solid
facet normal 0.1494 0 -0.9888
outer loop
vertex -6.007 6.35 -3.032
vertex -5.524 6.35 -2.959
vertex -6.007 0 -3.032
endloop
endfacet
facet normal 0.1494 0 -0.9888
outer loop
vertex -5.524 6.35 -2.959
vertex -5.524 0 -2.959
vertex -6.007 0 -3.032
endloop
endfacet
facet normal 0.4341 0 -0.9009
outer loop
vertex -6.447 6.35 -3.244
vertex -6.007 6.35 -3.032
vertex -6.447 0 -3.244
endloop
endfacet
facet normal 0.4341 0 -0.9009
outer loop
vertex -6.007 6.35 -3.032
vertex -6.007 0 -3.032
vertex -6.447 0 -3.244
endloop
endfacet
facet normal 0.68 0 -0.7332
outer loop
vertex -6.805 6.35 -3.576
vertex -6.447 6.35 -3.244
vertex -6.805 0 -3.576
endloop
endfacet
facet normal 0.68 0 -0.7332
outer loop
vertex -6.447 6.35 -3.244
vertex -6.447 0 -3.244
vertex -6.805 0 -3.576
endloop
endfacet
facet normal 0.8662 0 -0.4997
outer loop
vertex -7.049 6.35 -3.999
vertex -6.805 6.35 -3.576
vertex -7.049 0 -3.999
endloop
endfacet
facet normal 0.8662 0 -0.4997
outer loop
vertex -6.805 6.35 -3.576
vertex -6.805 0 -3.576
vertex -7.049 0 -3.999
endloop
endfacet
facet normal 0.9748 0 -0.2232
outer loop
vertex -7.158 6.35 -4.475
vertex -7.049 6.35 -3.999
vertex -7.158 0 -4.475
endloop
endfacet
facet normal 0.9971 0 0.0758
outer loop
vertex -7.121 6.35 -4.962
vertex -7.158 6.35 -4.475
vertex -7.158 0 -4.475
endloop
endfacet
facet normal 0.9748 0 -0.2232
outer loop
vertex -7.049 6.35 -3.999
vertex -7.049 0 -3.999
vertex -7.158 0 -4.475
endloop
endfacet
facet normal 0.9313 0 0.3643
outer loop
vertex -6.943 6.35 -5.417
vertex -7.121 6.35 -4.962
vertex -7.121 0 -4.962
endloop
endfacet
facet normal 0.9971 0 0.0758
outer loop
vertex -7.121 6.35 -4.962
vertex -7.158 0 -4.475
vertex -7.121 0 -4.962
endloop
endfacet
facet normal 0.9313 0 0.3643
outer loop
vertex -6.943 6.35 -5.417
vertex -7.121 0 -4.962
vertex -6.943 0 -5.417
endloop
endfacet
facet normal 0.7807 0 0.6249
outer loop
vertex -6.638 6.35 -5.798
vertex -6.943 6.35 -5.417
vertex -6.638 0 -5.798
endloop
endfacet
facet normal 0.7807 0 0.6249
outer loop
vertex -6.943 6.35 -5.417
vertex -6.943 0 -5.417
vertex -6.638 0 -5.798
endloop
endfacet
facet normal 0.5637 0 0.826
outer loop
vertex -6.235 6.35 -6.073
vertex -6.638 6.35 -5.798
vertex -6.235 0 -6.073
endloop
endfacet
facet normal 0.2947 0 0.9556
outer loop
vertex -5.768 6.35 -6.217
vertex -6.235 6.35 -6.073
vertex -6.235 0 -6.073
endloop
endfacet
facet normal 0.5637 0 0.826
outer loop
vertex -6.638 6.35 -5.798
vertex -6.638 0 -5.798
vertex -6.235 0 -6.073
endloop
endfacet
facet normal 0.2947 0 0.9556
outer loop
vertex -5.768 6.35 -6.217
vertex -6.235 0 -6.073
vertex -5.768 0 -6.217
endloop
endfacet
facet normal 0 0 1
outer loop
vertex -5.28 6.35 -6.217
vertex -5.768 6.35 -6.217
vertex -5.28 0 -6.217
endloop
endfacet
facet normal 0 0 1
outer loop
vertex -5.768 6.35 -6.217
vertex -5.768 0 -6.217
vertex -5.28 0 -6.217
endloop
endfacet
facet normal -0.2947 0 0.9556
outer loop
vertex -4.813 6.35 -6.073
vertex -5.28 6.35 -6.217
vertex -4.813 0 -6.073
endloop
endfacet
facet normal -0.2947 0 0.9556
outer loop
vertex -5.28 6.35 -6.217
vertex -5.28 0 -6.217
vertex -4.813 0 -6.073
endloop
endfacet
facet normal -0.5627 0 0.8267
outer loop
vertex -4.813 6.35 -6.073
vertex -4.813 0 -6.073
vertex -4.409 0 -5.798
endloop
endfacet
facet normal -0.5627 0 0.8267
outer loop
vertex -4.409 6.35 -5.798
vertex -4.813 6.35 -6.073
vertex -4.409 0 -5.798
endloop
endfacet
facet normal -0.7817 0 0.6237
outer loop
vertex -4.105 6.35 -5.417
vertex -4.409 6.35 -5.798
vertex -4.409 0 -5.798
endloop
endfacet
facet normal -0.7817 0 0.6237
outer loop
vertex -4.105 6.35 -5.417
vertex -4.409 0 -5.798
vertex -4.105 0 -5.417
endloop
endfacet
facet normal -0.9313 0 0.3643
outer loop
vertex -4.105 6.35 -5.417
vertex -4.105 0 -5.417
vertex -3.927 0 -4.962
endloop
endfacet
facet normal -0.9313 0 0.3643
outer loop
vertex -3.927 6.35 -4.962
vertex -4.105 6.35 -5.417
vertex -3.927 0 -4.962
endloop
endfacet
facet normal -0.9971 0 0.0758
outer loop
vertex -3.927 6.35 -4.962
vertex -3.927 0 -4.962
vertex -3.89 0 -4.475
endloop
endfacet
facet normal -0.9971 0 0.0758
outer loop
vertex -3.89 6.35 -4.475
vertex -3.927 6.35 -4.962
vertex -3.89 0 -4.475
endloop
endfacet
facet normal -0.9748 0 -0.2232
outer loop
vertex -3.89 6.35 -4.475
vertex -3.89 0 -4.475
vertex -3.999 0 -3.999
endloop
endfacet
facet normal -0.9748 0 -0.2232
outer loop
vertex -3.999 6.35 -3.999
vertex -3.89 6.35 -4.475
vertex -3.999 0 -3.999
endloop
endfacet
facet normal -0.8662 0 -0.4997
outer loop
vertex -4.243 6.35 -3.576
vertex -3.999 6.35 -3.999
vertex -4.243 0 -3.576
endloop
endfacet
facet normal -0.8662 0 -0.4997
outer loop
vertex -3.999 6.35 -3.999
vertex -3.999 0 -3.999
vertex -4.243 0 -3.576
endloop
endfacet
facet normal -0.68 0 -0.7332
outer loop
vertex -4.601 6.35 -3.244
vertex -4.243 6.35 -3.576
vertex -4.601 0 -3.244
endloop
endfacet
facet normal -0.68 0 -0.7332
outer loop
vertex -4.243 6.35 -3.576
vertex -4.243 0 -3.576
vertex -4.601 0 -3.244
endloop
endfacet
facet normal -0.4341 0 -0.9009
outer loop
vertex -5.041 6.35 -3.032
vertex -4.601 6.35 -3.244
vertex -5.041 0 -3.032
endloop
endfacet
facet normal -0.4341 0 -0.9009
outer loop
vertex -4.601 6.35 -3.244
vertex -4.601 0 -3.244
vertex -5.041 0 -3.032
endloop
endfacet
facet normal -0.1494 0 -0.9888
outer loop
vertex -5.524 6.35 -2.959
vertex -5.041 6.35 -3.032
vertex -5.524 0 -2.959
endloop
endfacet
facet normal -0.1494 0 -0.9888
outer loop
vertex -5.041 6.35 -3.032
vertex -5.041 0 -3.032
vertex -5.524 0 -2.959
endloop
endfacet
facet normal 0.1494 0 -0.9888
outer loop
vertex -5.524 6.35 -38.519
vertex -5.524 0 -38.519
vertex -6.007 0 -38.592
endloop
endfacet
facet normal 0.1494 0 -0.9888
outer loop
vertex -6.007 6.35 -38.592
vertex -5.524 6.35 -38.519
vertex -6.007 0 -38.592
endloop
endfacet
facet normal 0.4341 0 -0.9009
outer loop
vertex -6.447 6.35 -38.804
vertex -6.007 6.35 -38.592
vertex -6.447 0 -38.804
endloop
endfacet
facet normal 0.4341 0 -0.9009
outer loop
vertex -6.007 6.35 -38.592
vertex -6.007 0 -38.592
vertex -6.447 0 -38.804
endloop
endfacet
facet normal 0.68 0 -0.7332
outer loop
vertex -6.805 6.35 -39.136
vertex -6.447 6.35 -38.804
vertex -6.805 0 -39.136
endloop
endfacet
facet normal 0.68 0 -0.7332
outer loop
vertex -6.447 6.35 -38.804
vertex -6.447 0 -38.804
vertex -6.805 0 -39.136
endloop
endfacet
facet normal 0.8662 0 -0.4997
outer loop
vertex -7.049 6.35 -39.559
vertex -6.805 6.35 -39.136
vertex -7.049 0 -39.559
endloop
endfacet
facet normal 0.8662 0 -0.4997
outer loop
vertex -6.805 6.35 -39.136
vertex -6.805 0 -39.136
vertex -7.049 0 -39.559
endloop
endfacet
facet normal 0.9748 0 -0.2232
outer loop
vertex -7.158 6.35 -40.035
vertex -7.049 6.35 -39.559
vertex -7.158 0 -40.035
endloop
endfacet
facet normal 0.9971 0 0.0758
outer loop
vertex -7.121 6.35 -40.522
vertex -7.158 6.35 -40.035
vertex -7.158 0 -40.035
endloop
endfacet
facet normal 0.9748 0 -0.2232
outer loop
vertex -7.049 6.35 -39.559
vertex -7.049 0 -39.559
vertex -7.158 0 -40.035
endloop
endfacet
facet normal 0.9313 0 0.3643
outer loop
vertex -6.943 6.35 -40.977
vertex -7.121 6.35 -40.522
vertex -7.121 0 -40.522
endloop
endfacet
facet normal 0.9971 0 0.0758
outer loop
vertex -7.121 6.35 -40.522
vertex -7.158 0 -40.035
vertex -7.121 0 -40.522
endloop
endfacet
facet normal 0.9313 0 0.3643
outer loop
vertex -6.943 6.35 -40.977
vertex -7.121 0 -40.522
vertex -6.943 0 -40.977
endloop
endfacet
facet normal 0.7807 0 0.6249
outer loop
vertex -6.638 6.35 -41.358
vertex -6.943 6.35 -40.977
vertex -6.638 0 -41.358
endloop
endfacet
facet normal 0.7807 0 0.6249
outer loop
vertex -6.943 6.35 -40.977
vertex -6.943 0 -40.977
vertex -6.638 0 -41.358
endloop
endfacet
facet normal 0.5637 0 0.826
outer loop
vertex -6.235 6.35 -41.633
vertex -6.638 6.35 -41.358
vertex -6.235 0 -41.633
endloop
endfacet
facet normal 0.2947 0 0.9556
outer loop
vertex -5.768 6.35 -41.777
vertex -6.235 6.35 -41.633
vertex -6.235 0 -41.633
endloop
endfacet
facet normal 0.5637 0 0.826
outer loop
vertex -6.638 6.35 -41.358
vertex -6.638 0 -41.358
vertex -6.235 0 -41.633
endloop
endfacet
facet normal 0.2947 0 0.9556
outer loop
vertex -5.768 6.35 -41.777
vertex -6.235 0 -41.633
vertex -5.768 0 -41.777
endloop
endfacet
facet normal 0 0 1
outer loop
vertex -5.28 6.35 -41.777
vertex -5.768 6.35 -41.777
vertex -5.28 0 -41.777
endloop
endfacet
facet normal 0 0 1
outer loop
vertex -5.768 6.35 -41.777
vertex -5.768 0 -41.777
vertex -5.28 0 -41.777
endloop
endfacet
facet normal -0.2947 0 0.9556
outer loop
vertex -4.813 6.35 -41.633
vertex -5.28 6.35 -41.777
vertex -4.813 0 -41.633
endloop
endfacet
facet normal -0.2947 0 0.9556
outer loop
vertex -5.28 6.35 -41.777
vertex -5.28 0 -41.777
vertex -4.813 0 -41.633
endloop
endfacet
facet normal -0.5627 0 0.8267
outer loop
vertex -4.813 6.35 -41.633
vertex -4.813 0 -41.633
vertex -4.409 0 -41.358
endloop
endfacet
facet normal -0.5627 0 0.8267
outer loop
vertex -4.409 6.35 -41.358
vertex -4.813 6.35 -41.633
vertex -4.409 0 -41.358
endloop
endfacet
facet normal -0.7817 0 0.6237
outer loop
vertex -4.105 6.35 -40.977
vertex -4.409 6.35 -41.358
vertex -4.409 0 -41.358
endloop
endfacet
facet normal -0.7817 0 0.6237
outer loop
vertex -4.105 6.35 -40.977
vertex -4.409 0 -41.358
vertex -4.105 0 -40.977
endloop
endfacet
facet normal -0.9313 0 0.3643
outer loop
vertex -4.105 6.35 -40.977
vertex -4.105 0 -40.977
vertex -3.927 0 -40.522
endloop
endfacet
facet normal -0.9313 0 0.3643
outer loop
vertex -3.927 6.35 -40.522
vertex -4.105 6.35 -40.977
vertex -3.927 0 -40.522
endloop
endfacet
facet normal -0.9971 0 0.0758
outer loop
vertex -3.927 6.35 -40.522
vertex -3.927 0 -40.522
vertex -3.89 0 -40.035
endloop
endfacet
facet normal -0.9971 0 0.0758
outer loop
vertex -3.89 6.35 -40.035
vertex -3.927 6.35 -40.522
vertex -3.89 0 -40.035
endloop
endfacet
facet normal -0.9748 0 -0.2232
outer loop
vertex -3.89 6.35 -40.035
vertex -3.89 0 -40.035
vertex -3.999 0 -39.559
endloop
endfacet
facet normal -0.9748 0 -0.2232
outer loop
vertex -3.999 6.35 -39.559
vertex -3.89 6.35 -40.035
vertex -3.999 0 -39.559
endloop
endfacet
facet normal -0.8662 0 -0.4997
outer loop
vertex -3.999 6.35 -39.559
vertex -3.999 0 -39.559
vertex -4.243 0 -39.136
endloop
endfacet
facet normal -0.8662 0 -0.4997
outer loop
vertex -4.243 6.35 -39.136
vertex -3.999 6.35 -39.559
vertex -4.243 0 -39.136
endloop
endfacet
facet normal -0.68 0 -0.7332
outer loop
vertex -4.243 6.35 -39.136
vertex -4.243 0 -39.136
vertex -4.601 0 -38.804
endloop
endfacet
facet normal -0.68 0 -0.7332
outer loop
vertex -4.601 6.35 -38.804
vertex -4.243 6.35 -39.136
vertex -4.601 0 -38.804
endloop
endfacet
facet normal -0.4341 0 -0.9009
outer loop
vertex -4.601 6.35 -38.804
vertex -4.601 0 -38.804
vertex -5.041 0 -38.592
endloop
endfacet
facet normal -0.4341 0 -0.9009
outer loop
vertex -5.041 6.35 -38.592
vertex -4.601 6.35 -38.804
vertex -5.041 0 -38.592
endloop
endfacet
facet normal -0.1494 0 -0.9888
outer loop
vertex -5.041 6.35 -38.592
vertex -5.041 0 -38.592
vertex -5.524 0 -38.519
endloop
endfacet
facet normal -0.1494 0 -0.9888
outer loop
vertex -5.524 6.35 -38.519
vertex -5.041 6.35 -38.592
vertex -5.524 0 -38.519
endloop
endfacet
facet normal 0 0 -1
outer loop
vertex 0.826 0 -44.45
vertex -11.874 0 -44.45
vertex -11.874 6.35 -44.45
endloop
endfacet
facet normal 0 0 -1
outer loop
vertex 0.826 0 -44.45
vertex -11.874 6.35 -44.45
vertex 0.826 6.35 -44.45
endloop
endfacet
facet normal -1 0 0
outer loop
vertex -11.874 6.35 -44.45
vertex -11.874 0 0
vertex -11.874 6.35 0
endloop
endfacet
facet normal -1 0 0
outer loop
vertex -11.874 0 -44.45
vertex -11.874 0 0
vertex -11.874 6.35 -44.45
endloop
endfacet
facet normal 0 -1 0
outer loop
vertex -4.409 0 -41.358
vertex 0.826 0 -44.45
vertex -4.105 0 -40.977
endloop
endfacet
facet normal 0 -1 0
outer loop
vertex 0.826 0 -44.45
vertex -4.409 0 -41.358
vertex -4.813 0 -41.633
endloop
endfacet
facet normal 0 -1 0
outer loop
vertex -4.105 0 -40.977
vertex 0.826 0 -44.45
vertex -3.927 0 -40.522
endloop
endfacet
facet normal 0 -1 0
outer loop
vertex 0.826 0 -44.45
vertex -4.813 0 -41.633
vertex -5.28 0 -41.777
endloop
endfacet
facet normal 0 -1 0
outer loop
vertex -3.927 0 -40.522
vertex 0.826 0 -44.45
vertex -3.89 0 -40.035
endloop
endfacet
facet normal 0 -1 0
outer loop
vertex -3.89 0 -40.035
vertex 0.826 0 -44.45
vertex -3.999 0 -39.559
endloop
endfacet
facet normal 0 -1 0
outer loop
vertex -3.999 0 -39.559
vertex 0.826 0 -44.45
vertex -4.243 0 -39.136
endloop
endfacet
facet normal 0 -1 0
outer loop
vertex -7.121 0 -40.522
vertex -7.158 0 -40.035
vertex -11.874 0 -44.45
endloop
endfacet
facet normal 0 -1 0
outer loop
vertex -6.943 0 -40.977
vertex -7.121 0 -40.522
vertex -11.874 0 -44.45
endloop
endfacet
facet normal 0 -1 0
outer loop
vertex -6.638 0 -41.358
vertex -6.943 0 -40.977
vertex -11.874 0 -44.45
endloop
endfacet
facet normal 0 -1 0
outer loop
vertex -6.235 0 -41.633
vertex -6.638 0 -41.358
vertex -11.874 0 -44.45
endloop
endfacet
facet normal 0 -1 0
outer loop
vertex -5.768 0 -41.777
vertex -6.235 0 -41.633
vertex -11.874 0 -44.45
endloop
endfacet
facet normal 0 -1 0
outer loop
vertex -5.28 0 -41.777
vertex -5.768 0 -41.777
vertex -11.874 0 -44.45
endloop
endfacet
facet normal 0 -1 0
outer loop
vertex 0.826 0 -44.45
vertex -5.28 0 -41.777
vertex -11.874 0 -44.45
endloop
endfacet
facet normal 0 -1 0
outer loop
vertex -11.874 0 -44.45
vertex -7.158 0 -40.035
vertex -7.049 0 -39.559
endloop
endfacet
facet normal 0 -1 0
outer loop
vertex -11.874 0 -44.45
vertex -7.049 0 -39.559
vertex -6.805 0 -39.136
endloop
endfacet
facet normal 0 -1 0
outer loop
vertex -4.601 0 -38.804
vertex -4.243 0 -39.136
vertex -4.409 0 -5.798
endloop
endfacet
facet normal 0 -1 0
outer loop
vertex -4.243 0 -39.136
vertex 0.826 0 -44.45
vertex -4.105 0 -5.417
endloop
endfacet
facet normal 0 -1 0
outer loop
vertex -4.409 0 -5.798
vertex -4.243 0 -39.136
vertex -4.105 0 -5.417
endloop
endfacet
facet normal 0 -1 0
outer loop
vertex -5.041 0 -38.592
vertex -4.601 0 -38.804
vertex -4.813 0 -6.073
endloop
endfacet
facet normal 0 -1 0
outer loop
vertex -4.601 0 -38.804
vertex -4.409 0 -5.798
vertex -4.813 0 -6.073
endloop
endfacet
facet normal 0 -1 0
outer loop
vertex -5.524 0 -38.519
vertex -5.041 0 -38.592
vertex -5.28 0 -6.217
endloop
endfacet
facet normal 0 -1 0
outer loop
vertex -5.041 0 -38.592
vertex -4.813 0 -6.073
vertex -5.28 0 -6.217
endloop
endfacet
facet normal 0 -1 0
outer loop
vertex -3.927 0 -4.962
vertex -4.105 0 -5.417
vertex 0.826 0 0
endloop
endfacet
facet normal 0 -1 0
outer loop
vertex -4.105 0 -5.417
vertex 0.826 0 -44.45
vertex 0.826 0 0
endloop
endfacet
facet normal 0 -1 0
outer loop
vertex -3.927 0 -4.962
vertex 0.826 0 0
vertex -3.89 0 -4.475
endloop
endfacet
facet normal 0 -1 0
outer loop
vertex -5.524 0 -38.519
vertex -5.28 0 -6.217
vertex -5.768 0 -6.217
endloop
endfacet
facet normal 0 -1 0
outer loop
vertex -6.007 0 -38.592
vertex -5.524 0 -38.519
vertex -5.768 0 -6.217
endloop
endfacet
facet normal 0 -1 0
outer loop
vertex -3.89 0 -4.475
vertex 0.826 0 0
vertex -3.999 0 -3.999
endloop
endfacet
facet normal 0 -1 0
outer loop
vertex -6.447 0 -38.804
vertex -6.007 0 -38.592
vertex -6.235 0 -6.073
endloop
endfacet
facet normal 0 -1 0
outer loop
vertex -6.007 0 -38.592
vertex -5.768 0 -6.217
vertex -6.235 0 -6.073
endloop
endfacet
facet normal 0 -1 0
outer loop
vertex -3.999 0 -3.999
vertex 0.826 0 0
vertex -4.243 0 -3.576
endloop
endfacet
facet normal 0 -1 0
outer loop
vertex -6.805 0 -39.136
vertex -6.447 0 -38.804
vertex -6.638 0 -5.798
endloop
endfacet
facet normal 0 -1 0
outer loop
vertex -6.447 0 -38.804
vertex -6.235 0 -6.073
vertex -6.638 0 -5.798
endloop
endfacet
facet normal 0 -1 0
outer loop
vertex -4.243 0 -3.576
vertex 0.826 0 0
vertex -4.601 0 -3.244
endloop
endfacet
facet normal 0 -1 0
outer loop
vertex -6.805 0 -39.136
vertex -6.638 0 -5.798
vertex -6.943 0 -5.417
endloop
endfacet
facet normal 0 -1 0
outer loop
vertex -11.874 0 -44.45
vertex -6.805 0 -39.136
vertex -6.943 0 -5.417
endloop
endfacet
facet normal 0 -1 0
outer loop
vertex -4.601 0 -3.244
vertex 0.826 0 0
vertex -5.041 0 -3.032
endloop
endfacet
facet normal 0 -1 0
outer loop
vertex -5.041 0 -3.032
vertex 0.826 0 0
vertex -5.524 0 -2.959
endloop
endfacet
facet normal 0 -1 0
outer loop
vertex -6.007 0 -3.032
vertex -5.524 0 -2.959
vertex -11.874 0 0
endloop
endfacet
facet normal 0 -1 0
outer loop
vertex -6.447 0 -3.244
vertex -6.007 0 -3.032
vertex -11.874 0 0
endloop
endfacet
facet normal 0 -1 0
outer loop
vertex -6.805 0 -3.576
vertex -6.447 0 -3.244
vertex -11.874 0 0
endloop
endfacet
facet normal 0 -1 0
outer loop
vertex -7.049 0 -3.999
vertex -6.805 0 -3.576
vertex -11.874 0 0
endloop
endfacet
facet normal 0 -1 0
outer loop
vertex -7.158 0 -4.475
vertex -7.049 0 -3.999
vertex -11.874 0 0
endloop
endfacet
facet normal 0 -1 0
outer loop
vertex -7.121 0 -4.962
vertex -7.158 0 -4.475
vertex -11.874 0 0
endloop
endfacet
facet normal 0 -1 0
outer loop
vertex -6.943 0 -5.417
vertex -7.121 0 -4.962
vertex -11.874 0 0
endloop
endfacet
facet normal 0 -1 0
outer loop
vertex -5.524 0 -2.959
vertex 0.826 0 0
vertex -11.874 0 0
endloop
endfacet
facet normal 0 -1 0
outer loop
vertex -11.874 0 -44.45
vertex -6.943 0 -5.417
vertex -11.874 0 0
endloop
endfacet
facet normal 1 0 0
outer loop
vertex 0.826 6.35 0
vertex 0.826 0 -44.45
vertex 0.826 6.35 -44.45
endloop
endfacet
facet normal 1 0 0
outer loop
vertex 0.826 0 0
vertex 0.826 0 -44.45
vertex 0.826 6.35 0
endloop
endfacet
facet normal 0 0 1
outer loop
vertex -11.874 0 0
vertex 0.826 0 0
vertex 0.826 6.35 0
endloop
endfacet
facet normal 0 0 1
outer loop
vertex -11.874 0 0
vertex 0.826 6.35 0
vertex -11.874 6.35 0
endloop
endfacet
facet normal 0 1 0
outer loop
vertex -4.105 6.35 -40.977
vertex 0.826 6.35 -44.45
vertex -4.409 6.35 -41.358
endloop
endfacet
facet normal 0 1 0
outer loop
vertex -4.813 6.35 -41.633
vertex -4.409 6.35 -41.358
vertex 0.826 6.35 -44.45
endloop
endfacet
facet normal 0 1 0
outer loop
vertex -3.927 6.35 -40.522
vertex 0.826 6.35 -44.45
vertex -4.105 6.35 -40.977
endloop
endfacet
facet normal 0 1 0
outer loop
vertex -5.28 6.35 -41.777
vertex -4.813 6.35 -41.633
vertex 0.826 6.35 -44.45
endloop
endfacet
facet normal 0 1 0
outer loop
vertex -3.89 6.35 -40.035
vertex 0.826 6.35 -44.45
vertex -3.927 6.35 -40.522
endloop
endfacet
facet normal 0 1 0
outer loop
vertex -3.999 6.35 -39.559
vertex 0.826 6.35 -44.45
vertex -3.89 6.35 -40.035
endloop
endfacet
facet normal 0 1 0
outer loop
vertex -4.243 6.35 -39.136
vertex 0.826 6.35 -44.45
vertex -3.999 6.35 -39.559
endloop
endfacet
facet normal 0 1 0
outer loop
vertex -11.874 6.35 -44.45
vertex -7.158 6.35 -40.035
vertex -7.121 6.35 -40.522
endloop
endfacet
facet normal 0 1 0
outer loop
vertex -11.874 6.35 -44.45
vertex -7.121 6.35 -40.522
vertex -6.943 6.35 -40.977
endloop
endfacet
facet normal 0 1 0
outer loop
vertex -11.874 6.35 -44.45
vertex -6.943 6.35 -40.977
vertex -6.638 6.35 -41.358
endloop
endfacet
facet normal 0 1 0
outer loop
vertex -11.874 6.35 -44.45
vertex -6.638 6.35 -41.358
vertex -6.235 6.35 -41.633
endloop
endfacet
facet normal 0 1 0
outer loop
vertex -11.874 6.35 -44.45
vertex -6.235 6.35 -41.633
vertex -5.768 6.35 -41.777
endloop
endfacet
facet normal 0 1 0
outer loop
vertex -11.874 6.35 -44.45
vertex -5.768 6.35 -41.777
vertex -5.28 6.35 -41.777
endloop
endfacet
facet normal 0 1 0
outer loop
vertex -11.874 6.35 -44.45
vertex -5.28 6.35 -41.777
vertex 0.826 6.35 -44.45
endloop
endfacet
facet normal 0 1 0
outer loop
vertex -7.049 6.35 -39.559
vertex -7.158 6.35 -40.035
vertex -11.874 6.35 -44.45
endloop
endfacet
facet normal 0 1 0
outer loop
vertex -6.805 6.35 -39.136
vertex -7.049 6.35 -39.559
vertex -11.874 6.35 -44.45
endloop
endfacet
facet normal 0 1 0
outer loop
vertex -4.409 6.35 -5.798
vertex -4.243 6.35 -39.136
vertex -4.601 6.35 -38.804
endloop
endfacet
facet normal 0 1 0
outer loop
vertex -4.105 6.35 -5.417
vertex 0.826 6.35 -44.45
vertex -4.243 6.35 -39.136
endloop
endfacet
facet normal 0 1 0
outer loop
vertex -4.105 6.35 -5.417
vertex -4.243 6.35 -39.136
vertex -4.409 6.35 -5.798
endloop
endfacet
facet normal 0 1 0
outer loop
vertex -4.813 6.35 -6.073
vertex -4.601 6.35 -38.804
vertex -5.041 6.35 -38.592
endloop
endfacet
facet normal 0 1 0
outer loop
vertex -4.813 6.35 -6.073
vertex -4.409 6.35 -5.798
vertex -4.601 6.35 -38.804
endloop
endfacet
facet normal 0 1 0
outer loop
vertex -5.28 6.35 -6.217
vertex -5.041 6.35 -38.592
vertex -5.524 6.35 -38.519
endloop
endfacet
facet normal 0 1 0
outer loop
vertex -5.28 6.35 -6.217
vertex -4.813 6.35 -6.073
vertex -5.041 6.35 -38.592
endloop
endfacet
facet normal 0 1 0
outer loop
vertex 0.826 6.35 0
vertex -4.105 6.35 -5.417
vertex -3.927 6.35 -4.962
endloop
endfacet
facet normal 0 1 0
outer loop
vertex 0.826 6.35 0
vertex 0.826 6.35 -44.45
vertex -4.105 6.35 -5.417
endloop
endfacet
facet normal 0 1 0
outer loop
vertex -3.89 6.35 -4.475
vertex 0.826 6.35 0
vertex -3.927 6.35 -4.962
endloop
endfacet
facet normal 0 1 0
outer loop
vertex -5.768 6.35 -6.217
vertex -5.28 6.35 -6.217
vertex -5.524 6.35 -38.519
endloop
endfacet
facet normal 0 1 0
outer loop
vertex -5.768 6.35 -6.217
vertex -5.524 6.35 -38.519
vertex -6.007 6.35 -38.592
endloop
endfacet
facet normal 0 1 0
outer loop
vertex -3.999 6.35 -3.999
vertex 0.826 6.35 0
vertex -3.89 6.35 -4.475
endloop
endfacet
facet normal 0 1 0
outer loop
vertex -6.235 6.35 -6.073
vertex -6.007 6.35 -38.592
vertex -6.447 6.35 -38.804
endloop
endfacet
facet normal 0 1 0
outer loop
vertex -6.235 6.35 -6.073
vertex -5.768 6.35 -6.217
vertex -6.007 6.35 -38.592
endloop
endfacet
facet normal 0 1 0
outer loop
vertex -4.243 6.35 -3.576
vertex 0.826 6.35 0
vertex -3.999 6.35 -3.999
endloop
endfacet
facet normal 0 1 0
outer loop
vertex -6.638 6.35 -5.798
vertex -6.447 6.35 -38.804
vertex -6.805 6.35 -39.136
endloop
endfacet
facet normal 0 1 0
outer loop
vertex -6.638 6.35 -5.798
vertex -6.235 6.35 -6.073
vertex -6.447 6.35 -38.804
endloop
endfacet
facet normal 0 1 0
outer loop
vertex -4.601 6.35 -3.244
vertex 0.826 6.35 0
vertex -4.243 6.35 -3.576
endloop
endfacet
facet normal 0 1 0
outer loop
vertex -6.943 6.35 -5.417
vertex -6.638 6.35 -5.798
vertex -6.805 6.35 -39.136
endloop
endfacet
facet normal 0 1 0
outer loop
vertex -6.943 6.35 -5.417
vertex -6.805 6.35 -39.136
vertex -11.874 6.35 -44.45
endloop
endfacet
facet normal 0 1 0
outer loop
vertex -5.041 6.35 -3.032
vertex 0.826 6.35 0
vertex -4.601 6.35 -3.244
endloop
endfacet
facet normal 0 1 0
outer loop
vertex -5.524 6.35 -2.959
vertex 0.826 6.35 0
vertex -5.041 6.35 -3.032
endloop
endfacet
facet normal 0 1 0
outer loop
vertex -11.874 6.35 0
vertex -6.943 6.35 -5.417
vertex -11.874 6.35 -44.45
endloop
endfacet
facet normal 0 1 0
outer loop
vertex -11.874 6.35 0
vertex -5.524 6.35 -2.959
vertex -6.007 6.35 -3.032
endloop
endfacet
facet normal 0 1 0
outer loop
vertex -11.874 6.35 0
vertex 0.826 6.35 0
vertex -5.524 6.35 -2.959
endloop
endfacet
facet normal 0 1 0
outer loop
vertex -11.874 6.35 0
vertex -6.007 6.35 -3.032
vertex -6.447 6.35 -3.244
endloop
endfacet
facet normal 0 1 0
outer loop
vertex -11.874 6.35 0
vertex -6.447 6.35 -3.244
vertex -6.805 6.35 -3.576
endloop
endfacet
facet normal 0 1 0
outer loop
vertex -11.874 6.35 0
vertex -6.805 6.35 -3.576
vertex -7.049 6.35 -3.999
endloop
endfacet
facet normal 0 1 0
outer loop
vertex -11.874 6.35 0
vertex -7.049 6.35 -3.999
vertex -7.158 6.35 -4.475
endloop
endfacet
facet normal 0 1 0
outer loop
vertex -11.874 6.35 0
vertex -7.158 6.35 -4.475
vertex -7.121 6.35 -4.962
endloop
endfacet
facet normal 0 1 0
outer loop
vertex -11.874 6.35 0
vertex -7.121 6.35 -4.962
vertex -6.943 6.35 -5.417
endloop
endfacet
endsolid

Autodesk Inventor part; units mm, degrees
ref_plane "YZ Plane" through (0, 0, 0) normal (1, 0, 0) x (0, 1, 0)
ref_plane "XZ Plane" through (0, 0, 0) normal (0, 1, 0) x (-1, 0, 0)
ref_plane "XY Plane" through (0, 0, 0) normal (0, 0, 1) x (1, 0, 0)
sketch "Sketch1" plane through (0, 0, 0) normal (0, 1, 0) x (-1, 0, 0)
  line L0 (-0.8262, 0) -> (11.8738, 0)
  line L1 (11.8738, 0) -> (11.8738, -44.45)
  line L2 (11.8738, -44.45) -> (-0.8262, -44.45)
  line L3 (-0.8262, -44.45) -> (-0.8262, 0)
  point P0 (0, 0)
  dimension "d0" = 44.45
  dimension "d1" = 12.7
extrude "Plate1" add sketch "Sketch1" along normal blind 6.35
sketch "Sketch2" plane through (0, 6.35, 0) normal (0, 1, 0) x (1, 0, 0)
  line L0 (0.8262, 0) -> (-11.8738, 0) projected
  line L1 (0.8262, 44.45) -> (0.8262, 0) projected
  point P0 (0, 0)
  point P1 (-5.5238, 4.5974)
  point P2 (-5.5238, 40.1574)
  dimension "d4" = 35.56
  dimension "d5" = 4.5974
  dimension "d6" = 6.35
  dimension "d7" = 6.35
hole "Hole1" at (-5.5238, 6.35, -4.5974) at (-5.5238, 6.35, -40.1574) direction (0, -1, 0) diameter 3.2766 end through all clearance for "Flat Head Machine Screw (82)" size "#4" standard "Ansi Unified Screw Threads"
equation "\"d13\" = Thickness"
equation "\"d2\" = Thickness"
equation "\"BendRadius\" = Thickness"
equation "\"BendReliefWidth\" = Thickness"
equation "\"BendReliefDepth\" = 0.5 * Thickness"
equation "\"CornerReliefSize\" = 4 * Thickness"
equation "\"MinimumRemnant\" = 2 * Thickness"
equation "\"TransitionRadius\" = BendRadius"
equation "\"JacobiRadiusSize\" = BendRadius"
equation "\"GapSize\" = Thickness"
equation "\"Thickness\" = 6.35"
properties part number "servo hold down"
